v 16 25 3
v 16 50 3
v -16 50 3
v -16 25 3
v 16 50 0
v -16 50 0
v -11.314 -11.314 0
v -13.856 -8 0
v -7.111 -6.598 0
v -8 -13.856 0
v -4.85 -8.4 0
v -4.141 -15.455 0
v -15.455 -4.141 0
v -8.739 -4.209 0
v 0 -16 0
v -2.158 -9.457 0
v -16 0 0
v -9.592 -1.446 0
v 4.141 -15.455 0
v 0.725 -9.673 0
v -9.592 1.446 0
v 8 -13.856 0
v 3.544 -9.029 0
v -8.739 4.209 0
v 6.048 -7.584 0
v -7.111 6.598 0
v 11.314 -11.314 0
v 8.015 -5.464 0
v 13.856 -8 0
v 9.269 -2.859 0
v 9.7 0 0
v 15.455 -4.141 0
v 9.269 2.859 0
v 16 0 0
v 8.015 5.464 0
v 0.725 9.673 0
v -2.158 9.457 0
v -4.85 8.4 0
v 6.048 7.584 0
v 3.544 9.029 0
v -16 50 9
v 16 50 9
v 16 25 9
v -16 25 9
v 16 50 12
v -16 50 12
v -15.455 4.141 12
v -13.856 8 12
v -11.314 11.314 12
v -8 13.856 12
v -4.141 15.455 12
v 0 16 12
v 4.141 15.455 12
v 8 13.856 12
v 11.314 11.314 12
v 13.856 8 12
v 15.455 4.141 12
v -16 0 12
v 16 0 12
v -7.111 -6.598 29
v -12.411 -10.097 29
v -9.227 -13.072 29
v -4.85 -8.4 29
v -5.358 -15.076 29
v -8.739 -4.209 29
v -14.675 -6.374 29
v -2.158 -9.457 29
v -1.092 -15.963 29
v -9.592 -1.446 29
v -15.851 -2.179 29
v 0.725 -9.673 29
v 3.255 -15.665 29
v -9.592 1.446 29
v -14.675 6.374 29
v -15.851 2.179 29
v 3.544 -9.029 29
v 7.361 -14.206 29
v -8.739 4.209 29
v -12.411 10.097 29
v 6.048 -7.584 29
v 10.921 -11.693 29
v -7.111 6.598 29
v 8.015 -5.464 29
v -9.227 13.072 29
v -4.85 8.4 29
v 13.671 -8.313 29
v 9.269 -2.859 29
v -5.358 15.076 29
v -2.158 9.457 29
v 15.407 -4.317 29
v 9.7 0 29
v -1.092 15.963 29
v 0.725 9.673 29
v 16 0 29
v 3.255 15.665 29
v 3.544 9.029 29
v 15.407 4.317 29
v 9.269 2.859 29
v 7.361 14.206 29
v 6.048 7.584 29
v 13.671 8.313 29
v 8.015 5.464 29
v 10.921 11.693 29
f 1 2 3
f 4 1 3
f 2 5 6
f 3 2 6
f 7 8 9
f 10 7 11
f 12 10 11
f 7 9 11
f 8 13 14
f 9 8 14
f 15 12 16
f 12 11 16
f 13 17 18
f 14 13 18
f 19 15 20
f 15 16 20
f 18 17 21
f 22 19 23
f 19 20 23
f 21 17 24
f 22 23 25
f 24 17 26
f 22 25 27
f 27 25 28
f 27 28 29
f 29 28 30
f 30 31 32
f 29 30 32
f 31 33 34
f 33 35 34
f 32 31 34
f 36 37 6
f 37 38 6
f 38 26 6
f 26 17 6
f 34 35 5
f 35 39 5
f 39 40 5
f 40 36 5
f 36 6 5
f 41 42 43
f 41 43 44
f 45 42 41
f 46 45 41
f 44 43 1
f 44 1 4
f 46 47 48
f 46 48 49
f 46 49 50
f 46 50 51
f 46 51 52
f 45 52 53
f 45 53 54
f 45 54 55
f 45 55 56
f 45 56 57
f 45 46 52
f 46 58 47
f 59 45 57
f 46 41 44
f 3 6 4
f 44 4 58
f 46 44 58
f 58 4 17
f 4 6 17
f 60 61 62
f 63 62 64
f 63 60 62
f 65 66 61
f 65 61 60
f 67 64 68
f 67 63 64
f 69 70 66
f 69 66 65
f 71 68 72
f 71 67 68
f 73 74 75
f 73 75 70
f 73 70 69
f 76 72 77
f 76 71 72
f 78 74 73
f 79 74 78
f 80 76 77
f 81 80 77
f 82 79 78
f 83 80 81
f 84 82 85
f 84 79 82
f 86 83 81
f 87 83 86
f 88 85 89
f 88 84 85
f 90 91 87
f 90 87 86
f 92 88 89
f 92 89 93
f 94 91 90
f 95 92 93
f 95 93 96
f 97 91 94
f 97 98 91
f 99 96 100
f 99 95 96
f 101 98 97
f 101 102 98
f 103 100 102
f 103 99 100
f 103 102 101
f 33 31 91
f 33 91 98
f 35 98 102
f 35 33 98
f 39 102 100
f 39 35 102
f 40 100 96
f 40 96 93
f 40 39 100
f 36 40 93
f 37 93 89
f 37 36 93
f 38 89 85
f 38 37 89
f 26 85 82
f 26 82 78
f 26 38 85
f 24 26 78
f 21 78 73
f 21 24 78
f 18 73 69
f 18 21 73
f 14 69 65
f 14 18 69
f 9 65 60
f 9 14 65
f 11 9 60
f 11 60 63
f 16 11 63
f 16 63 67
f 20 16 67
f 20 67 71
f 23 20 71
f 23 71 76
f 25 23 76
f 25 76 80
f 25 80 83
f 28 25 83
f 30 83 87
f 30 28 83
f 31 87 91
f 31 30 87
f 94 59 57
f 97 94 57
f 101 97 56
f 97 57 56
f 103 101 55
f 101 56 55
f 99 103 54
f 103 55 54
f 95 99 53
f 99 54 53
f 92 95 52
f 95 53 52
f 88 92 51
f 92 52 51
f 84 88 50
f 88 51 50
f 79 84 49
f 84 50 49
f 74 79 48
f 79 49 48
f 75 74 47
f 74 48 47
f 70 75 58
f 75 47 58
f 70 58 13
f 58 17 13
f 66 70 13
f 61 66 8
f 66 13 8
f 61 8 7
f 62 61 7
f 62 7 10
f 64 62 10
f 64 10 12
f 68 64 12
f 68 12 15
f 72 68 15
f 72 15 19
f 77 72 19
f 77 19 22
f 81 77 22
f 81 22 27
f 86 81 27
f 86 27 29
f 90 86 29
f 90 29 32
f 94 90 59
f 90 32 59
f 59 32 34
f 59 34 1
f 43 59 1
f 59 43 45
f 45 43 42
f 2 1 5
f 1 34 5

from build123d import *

# Parameters (mm, degrees)
F0_R     = 16
F0_R_2   = 9.7
F1_DEPTH = 29
F2_R     = 9.75
F3_DEPTH = 12
F4_W     = 32
F4_H     = 6
F5_DEPTH = 25


with BuildPart() as f1:
    # F0 (on Top) → F1 (new body)
    with BuildSketch(Plane.XY):
        Circle(F0_R)
        Circle(F0_R_2, mode=Mode.SUBTRACT)
    extrude(amount=F1_DEPTH)

    # F2 (on Top) → F3 (join)
    with BuildSketch(Plane.XY):
        with BuildLine():
            Line((-16, 50), (-16, 0))
            ThreePointArc((-16, 0), (0, 16), (16, 0))
            Line((16, 0), (16, 50))
            Line((16, 50), (-16, 50))
        make_face()
        with BuildLine():
            ThreePointArc((16, 0), (0, 16), (-16, 0))
            ThreePointArc((-16, 0), (0, -16), (16, 0))
        make_face()
        Circle(F2_R, mode=Mode.SUBTRACT)
    extrude(amount=F3_DEPTH)

    # F4 (on face) → F5 (cut)
    with BuildSketch(Plane(origin=(0, 50, 0), x_dir=(-1, 0, 0), z_dir=(0, 1, 0))):
        with Locations((0, 6)):
            Rectangle(F4_W, F4_H)
    extrude(amount=-F5_DEPTH, mode=Mode.SUBTRACT)


solid = f1.part
